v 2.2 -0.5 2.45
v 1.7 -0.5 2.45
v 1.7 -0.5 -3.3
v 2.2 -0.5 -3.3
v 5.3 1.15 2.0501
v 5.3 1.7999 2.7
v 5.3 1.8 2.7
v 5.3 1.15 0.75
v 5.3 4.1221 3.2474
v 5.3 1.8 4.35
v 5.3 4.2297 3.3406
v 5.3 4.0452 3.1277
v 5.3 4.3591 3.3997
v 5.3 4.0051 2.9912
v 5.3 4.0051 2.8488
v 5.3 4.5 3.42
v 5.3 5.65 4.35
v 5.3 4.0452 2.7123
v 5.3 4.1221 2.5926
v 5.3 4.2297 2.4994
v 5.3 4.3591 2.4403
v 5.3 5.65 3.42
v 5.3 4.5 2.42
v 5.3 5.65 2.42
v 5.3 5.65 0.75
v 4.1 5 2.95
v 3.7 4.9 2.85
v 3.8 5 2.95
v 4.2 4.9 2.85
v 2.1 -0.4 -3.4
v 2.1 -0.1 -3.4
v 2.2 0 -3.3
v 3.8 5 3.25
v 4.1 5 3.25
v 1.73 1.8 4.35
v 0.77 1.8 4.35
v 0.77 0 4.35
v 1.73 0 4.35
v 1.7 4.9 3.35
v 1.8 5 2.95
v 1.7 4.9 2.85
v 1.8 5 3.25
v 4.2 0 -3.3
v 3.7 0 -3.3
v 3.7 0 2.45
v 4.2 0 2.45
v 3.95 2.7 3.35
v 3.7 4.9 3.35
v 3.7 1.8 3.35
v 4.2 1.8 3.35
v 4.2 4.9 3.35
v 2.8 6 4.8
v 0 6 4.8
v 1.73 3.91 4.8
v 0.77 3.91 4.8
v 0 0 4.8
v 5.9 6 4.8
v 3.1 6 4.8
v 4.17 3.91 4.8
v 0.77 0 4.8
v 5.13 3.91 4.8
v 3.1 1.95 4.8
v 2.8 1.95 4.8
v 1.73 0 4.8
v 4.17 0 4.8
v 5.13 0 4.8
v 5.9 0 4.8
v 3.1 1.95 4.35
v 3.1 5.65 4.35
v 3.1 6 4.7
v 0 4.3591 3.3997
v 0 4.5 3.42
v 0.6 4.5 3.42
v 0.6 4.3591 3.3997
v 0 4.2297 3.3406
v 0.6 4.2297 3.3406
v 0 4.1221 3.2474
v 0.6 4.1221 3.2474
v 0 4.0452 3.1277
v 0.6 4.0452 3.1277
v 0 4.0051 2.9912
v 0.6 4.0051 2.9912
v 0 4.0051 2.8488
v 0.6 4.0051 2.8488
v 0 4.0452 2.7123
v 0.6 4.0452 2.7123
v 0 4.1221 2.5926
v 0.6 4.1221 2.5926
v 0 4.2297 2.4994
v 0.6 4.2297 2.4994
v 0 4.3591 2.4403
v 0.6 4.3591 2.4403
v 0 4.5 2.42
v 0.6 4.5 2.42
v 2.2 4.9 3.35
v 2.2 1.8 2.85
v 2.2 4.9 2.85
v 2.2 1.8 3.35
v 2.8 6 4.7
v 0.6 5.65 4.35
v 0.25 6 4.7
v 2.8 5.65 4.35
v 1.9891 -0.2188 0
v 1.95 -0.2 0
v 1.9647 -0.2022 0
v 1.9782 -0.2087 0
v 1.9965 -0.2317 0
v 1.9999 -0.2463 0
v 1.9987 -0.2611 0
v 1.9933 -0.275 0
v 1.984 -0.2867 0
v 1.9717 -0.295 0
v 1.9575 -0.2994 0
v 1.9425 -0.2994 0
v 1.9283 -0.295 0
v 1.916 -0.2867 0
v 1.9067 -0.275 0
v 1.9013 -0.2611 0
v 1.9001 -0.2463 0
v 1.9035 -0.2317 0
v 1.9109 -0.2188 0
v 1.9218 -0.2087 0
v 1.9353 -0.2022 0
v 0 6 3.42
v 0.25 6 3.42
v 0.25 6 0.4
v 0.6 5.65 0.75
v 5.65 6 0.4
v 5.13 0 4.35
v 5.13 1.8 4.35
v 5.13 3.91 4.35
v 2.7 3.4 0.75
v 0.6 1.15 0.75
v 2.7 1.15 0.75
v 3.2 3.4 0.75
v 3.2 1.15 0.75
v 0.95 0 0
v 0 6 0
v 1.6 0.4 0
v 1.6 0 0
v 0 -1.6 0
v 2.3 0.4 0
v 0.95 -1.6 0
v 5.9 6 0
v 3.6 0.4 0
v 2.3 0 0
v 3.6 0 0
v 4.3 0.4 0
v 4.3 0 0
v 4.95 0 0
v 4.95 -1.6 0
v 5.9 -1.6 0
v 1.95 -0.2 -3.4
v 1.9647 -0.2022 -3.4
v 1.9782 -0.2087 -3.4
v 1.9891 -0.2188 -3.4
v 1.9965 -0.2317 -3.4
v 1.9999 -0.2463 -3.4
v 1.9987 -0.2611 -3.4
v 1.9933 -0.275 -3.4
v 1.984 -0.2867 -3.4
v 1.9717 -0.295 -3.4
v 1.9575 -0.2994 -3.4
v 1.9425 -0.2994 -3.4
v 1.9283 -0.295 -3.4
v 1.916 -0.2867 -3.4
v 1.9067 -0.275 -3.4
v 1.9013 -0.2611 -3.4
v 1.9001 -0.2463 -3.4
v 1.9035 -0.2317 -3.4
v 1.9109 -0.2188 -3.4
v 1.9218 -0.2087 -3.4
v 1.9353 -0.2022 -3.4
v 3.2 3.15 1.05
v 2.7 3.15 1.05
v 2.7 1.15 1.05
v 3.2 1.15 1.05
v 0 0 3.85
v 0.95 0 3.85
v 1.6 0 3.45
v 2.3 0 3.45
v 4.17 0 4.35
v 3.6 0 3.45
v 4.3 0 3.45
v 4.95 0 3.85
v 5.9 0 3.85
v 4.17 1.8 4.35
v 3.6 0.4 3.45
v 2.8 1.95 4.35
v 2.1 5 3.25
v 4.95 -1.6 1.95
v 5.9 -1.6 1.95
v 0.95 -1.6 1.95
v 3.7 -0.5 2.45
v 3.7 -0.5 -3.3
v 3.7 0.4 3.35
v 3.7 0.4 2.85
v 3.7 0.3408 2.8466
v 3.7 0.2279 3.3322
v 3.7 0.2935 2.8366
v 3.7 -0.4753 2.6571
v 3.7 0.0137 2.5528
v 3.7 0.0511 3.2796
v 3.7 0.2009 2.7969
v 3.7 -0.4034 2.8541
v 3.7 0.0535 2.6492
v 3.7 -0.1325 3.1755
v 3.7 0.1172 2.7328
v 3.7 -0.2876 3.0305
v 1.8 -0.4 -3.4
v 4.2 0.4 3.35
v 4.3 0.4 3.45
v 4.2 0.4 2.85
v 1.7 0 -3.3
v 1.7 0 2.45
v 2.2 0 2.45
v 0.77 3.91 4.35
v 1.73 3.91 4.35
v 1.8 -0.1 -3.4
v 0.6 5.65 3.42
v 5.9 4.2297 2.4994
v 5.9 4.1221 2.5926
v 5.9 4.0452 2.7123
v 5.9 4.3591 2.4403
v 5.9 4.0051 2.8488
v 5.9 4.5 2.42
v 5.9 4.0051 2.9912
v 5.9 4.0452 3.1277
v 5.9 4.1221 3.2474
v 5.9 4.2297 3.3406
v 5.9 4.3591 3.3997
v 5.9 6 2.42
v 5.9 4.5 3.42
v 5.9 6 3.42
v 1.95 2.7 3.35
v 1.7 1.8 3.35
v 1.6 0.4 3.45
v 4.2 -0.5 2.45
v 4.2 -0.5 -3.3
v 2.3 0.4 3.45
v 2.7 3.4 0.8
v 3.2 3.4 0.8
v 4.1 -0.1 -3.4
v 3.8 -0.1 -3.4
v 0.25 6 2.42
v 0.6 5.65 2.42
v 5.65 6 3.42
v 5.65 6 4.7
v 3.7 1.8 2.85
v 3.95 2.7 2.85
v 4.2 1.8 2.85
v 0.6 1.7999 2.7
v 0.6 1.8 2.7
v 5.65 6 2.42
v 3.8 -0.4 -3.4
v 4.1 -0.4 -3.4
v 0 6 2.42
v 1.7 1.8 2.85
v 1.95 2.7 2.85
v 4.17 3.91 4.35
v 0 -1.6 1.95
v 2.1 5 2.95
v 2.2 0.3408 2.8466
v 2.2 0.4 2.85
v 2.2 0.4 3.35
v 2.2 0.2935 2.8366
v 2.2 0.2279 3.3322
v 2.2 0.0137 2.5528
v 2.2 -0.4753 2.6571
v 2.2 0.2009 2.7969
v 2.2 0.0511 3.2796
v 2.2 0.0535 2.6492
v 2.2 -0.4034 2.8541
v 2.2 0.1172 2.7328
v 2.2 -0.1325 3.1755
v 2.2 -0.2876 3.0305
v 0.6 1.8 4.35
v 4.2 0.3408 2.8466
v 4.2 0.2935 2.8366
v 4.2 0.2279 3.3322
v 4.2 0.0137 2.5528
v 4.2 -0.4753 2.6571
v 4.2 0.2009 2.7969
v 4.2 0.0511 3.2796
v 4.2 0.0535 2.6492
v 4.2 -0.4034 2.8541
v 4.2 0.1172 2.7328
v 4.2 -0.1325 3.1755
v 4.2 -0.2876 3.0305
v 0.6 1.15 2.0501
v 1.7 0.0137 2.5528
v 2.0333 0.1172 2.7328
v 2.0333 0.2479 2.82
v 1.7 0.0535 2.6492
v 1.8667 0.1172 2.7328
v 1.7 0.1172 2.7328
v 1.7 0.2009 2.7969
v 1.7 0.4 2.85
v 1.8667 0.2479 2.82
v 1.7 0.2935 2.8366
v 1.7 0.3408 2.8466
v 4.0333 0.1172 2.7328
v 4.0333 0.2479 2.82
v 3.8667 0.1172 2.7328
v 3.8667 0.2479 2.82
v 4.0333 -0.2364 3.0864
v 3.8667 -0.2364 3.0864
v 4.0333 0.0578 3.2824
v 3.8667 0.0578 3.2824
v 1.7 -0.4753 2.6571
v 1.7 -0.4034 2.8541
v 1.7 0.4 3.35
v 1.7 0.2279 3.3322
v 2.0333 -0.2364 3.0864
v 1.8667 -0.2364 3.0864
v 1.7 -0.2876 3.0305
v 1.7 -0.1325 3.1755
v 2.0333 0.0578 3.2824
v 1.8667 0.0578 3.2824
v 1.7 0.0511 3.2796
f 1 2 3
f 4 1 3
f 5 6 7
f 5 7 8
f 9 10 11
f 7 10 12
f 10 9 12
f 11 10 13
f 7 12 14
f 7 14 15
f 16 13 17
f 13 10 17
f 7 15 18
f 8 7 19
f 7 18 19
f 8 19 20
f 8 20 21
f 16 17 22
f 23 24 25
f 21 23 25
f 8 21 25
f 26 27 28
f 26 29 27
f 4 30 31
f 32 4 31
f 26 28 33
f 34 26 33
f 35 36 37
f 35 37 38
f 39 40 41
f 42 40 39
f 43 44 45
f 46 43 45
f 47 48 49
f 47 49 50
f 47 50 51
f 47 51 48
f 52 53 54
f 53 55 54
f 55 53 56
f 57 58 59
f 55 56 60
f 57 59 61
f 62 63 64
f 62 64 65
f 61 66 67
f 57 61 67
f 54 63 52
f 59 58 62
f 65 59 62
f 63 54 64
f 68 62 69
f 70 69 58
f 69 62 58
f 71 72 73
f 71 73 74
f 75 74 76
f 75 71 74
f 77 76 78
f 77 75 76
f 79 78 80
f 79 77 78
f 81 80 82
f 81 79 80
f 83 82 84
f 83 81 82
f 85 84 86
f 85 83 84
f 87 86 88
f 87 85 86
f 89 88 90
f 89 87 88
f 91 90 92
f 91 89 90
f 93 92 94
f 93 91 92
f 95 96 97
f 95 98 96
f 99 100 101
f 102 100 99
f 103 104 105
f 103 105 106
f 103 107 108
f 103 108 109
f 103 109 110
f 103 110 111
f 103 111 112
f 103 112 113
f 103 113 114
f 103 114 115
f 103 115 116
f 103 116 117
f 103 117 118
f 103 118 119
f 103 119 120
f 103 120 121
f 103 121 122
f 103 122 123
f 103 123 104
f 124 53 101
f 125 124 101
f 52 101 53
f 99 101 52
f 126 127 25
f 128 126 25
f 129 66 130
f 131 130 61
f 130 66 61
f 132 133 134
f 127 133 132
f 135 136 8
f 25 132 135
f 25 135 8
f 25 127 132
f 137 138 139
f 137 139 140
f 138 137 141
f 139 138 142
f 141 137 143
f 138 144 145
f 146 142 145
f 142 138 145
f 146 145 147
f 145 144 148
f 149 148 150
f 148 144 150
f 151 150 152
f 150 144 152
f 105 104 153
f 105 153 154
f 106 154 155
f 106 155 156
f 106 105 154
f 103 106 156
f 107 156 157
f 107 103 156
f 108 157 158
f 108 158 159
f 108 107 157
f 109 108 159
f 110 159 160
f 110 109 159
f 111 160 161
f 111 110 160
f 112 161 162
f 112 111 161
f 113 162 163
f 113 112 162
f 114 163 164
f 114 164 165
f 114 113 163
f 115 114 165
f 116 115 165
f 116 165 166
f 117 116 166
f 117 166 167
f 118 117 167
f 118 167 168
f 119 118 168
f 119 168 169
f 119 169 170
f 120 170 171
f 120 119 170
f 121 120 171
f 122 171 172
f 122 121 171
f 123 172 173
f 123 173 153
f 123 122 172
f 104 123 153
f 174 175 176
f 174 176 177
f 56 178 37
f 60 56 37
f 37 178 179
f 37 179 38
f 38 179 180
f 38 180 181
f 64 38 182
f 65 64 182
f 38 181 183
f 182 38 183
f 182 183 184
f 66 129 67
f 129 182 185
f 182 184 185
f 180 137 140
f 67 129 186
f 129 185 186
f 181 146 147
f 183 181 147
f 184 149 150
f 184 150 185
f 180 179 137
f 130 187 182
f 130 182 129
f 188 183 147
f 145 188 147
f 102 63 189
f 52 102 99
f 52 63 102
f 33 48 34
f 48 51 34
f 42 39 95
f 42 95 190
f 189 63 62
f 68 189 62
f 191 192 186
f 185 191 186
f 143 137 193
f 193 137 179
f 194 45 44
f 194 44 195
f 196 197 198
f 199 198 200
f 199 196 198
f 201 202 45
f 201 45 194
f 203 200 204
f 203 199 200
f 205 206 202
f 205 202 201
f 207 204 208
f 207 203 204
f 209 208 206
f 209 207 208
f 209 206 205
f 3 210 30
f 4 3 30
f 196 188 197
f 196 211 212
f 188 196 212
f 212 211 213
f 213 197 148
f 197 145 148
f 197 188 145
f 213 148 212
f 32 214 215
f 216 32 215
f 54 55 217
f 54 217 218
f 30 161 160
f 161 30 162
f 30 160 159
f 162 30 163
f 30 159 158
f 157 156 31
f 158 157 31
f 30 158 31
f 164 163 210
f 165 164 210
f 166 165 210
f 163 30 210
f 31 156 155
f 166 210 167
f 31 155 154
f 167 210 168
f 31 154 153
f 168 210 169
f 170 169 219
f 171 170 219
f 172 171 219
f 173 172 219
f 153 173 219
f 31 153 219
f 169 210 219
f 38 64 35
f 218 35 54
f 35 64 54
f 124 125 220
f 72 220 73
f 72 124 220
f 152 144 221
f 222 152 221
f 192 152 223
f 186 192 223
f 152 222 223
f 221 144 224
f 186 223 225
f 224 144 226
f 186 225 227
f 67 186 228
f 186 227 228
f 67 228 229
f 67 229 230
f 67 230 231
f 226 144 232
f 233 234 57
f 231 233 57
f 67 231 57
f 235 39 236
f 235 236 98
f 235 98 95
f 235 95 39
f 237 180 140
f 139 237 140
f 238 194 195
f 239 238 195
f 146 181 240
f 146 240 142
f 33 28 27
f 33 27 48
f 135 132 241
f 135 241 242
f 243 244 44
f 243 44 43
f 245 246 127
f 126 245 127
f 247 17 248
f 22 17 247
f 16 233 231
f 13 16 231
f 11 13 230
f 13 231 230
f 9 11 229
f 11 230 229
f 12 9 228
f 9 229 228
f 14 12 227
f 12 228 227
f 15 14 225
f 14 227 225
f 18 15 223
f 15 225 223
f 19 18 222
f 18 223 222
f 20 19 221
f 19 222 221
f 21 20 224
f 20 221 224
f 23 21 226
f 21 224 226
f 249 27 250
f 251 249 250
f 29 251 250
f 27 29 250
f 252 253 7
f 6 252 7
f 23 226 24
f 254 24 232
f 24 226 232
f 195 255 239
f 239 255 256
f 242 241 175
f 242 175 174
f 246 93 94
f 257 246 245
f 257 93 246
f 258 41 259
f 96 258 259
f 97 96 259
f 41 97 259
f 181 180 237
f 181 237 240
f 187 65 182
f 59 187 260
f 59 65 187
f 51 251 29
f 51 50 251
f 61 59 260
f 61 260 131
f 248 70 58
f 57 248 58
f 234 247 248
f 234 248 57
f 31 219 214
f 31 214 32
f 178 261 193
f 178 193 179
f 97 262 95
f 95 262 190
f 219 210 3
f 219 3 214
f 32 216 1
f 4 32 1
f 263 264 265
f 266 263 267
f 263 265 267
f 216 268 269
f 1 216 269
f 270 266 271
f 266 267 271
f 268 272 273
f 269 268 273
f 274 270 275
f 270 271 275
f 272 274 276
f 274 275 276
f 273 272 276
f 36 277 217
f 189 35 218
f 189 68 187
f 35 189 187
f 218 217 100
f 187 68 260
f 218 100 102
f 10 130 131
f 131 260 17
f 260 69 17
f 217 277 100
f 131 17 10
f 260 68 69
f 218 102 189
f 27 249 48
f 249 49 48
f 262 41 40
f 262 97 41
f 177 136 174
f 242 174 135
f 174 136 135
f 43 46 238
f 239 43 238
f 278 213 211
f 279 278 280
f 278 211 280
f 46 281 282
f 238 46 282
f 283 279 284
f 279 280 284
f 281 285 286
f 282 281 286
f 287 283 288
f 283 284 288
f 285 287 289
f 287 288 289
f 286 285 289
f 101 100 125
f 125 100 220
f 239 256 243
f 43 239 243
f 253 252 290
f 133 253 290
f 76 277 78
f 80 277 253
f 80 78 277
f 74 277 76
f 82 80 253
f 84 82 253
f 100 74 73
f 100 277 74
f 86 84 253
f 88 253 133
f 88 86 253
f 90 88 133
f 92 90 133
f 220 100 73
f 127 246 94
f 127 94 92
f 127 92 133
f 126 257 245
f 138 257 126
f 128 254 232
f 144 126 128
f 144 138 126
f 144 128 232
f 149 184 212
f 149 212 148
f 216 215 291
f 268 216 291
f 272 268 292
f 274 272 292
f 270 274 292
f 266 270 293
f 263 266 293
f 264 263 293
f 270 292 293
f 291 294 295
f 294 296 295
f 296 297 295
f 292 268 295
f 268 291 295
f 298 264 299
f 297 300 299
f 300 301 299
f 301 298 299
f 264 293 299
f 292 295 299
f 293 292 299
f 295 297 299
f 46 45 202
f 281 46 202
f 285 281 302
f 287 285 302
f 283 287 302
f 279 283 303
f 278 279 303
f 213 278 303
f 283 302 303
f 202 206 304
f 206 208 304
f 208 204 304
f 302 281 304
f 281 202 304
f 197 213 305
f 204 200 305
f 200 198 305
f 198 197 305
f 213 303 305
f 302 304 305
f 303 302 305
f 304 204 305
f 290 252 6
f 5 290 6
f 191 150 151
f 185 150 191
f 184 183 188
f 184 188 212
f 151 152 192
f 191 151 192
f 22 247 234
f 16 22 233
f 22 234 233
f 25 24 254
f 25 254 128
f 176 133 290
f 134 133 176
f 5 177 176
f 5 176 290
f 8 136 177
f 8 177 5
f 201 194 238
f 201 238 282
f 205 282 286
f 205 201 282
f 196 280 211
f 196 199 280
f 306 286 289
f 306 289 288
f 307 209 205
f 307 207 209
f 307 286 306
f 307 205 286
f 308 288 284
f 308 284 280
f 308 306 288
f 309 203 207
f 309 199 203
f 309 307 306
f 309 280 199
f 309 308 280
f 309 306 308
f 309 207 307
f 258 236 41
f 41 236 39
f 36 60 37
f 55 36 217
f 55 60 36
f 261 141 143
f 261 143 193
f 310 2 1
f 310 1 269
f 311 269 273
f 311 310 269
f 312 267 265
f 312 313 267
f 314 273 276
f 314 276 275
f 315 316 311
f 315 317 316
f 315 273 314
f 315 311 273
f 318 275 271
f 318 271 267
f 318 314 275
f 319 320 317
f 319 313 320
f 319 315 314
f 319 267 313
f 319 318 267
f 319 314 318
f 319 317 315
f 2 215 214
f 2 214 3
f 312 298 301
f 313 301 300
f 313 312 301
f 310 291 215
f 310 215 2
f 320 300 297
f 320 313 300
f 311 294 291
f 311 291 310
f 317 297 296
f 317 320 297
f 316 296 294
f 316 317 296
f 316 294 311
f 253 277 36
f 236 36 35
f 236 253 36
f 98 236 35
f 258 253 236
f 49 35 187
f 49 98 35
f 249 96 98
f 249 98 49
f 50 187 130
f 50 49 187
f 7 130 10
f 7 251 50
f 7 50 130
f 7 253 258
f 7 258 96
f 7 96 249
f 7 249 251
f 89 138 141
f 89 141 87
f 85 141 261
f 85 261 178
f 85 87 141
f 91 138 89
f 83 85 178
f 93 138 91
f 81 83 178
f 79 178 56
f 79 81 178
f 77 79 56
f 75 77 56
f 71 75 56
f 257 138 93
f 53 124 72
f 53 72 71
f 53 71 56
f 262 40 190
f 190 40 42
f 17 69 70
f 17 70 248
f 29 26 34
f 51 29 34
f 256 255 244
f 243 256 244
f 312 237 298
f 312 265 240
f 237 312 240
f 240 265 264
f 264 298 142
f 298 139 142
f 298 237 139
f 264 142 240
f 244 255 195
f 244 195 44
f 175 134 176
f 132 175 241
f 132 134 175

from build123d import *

# Parameters (mm, degrees)
BODY1_W                            = 5.9
BODY1_H                            = 4.8
EXTRUDE_1_DEPTH                    = 6
SKETCH_2_W                         = 4.7
SKETCH_2_H                         = 3.6
CUT_EXTRUDE_1_DEPTH                = 4.2
CHAMFER_1_SIZE                     = 0.35
SKETCH_4_W                         = 0.96
SKETCH_4_H                         = 3.91
CUT_EXTRUDE_3_DEPTH                = 0.45
SKETCH_5_W                         = 0.7
SKETCH_5_H                         = 3.45
CUT_EXTRUDE_4_DEPTH                = 0.4
CUT_EXTRUDE_6_REACH                = 11.688
SKETCH_8_W                         = 0.3
SKETCH_8_H                         = 4.05
CUT_EXTRUDE_7_REACH                = 11.688
SKETCH_15_W                        = 4.7
SKETCH_15_H                        = 1.95
CUT_EXTRUDE_9_DEPTH                = 0.65
CHAMFER_7_SIZE                     = 0.65
SKETCH_10_W                        = 0.5
SKETCH_10_H                        = 2.25
EXTRUDE_2_DEPTH                    = 0.3
CHAMFER_2_SIZE                     = 0.25
EXTRUDE_5_DEPTH                    = 0.95
SWEEP_START                        = 1.7
SWEEP_1_DEPTH                      = 0.5
CHAMFER_8_SIZE                     = 0.1
PATTERN_LINEAR_5_COUNT             = 2
PATTERN_LINEAR_5_PITCH             = 2
CHAMFER_8_OF_PATTERN_LINEAR_5_SIZE = 0.1
SKETCH_18_R                        = 0.05
CUT_EXTRUDE_10_DEPTH               = 3.4


# Read off the part's stored shape, not the designer's step: По траектории1
with BuildPart() as part:
    # Body1 → Бобышка-Вытянуть1 (new body)
    with BuildSketch(Plane(origin=(0, 0, 0), x_dir=(1, 0, 0), z_dir=(0, 1, 0))):
        with Locations((2.95, -2.4)):
            Rectangle(BODY1_W, BODY1_H)
    extrude(amount=EXTRUDE_1_DEPTH)

    # Эскиз2 → Вырез-Вытянуть1 (cut)
    with BuildSketch(Plane(origin=(0, 6, 0), x_dir=(1, 0, 0), z_dir=(0, 1, 0))):
        with Locations((2.95, -2.55)):
            Rectangle(SKETCH_2_W, SKETCH_2_H)
    extrude(amount=-CUT_EXTRUDE_1_DEPTH, mode=Mode.SUBTRACT)

    # Фаска1
    chamfer_1_edges = [part.edges().sort_by_distance(p)[0] for p in [
        (5.3, 6, 2.55),
        (2.95, 6, 0.75),
        (0.6, 6, 2.55),
        (2.95, 6, 4.35),
    ]]
    chamfer(chamfer_1_edges, length=CHAMFER_1_SIZE)

    # Эскиз4 → Вырез-Вытянуть3 (cut)
    with BuildSketch(Plane.XY.offset(4.8)):
        with Locations((1.25, 1.955)):
            Rectangle(SKETCH_4_W, SKETCH_4_H)
        with Locations((4.65, 1.955)):
            Rectangle(SKETCH_4_W, SKETCH_4_H)
    extrude(amount=-CUT_EXTRUDE_3_DEPTH, mode=Mode.SUBTRACT)

    # Эскиз5 → Вырез-Вытянуть4 (cut)
    with BuildSketch(Plane(origin=(0, 0, 4.8), x_dir=(1, 0, 0), z_dir=(0, 1, 0))):
        with Locations((1.95, 3.075)):
            Rectangle(SKETCH_5_W, SKETCH_5_H)
    cut_extrude_4 = extrude(amount=CUT_EXTRUDE_4_DEPTH, mode=Mode.SUBTRACT)

    # Эскиз8 → Вырез-Вытянуть6 (cut, up to next)
    with BuildSketch(Plane.XY.offset(4.8), mode=Mode.PRIVATE) as cut_extrude_6_sk1:
        with Locations((2.95, 3.975)):
            Rectangle(SKETCH_8_W, SKETCH_8_H)
    cut_extrude_6_tool1 = extrude(cut_extrude_6_sk1.sketch, amount=-CUT_EXTRUDE_6_REACH, mode=Mode.PRIVATE) & part.part
    add(cut_extrude_6_tool1.solids().sort_by_distance((2.95, 3.975, 4.8))[0], mode=Mode.SUBTRACT)

    # Эскиз9 → Вырез-Вытянуть7 (cut, up to next)
    with BuildSketch(Plane.ZY, mode=Mode.PRIVATE) as cut_extrude_7_sk1:
        with BuildLine():
            Line((2.42, 6), (3.42, 6))
            Line((3.42, 6), (3.42, 4.5))
            ThreePointArc((3.42, 4.5), (2.92, 4), (2.42, 4.5))
            Line((2.42, 4.5), (2.42, 6))
        make_face()
    cut_extrude_7_tool1 = extrude(cut_extrude_7_sk1.sketch, amount=-CUT_EXTRUDE_7_REACH, mode=Mode.PRIVATE) & part.part
    cut_extrude_7 = cut_extrude_7_tool1.solids().sort_by_distance((0, 5.05036, 2.92))[0]
    add(cut_extrude_7, mode=Mode.SUBTRACT)

    # Зеркальное отражение1: Вырез-Вытянуть7 across plane
    add(cut_extrude_7.mirror(Plane(origin=(2.95, 0, 0), x_dir=(0, 0, 1), z_dir=(1, 0, 0))), mode=Mode.SUBTRACT)

    # Эскиз15 → Вырез-Вытянуть9 (cut)
    with BuildSketch(Plane(origin=(0, 1.8, 0), x_dir=(1, 0, 0), z_dir=(0, 1, 0))):
        with Locations((2.95, -1.725)):
            Rectangle(SKETCH_15_W, SKETCH_15_H)
    extrude(amount=-CUT_EXTRUDE_9_DEPTH, mode=Mode.SUBTRACT)

    # Фаска7
    chamfer_7_edges = [part.edges().sort_by_distance(p)[0] for p in [
        (2.95, 1.15, 2.7),
    ]]
    chamfer(chamfer_7_edges, length=CHAMFER_7_SIZE - 0.0001)  # a hair under: the kernel refuses the full size

    # Эскиз10 → Бобышка-Вытянуть2 (add)
    with BuildSketch(Plane.XY.offset(0.75)):
        with Locations((2.95, 2.275)):
            Rectangle(SKETCH_10_W, SKETCH_10_H)
    extrude(amount=EXTRUDE_2_DEPTH)

    # Фаска2
    chamfer_2_edges = [part.edges().sort_by_distance(p)[0] for p in [
        (2.95, 3.4, 1.05),
    ]]
    chamfer(chamfer_2_edges, length=CHAMFER_2_SIZE)

    # Эскиз17 → Бобышка-Вытянуть5 (add)
    with BuildSketch(Plane.ZY):
        Polygon((0, -1.6), (1.95, -1.6), (3.85, 0), (0, 0), align=None)
    extrude_5 = extrude(amount=-EXTRUDE_5_DEPTH)

    # Зеркальное отражение3: Бобышка-Вытянуть5 across plane
    add(extrude_5.mirror(Plane(origin=(2.95, 0, 0), x_dir=(0, 0, 1), z_dir=(1, 0, 0))))

    # По траектории1 outline → По траектории1 (add)
    with BuildSketch(Plane.YZ.offset(SWEEP_START)):
        with BuildLine():
            add(Edge.make_bspline(
                [(-0.5, 2.45), (-0.5, 2.683362296), (-0.405057001, 2.917735205), (-0.152065654, 3.170726552), (-0.050887811, 3.237723146), (0.166472235, 3.327081743), (0.298557942, 3.349954697), (0.4, 3.35)],
                knots=[0.50998091, 0.50998091, 0.50998091, 0.50998091, 0.55448514, 0.55448514, 0.576737255, 0.576737255, 0.59898937, 0.59898937, 0.59898937, 0.59898937], degree=3))
            Line((-0.5, 2.45), (-0.5, -3.4))
            Line((-0.5, -3.4), (0, -3.4))
            Line((0, -3.4), (0, 2.45))
            add(Edge.make_bspline(
                [(0, 2.45), (0, 2.553716576), (0.042196888, 2.657882313), (0.154637487, 2.770322912), (0.199605417, 2.800099176), (0.296209882, 2.839814108), (0.331279974, 2.849979865), (0.4, 2.85)],
                knots=[0.50998091, 0.50998091, 0.50998091, 0.50998091, 0.55448514, 0.55448514, 0.576737255, 0.576737255, 0.59898937, 0.59898937, 0.59898937, 0.59898937], degree=3))
            Line((0.4, 2.85), (0.4, 3.35))
        make_face()
        with BuildLine():
            Line((1.8, 3.35), (1.8, 2.85))
            add(Edge.make_bspline(
                [(1.8, 2.85), (2.1, 2.85), (2.4, 2.85), (3.466666667, 2.85), (4.233333333, 2.85), (5, 2.85)],
                knots=[0.721036083, 0.721036083, 0.721036083, 0.721036083, 0.799494685, 0.799494685, 1, 1, 1, 1], degree=3))
            Line((5, 2.85), (5, 3.35))
            add(Edge.make_bspline(
                [(1.8, 3.35), (2.1, 3.35), (2.4, 3.35), (3.466666667, 3.35), (4.233333333, 3.35), (5, 3.35)],
                knots=[0.721036083, 0.721036083, 0.721036083, 0.721036083, 0.799494685, 0.799494685, 1, 1, 1, 1], degree=3))
        make_face()
    sweep_1 = extrude(amount=SWEEP_1_DEPTH)

    # Фаска8
    chamfer_8_edges = [part.edges().sort_by_distance(p)[0] for p in [
        (1.95, 5, 2.85),
        (2.2, 5, 3.1),
        (1.95, 5, 3.35),
        (1.7, 5, 3.1),
        (1.95, -0.5, -3.4),
        (2.2, -0.25, -3.4),
        (1.95, 0, -3.4),
        (1.7, -0.25, -3.4),
    ]]
    chamfer(chamfer_8_edges, length=CHAMFER_8_SIZE)

    # Линейный массив5: Вырез-Вытянуть4, По траектории1 ×2
    with Locations(*[(i * PATTERN_LINEAR_5_PITCH, 0, 0) for i in range(1, PATTERN_LINEAR_5_COUNT)]):
        add(cut_extrude_4, mode=Mode.SUBTRACT)
        add(sweep_1)

    # Фаска8 of Линейный массив5
    chamfer_8_of_pattern_linear_5_edges = [part.edges().sort_by_distance(p)[0] for p in [
        (3.95, 5, 2.85),
        (4.2, 5, 3.1),
        (3.95, 5, 3.35),
        (3.7, 5, 3.1),
        (3.95, -0.5, -3.4),
        (4.2, -0.25, -3.4),
        (3.95, 0, -3.4),
        (3.7, -0.25, -3.4),
    ]]
    chamfer(chamfer_8_of_pattern_linear_5_edges, length=CHAMFER_8_OF_PATTERN_LINEAR_5_SIZE)

    # Эскиз18 → Вырез-Вытянуть10 (cut)
    with BuildSketch(Plane(origin=(0, 0, 0), x_dir=(-1, 0, 0), z_dir=(0, 0, -1))):
        with Locations(Location((-1.95, -0.25, 0), (0, 0, 90))):
            Circle(SKETCH_18_R)
    extrude(amount=CUT_EXTRUDE_10_DEPTH, mode=Mode.SUBTRACT)


solid = part.part
